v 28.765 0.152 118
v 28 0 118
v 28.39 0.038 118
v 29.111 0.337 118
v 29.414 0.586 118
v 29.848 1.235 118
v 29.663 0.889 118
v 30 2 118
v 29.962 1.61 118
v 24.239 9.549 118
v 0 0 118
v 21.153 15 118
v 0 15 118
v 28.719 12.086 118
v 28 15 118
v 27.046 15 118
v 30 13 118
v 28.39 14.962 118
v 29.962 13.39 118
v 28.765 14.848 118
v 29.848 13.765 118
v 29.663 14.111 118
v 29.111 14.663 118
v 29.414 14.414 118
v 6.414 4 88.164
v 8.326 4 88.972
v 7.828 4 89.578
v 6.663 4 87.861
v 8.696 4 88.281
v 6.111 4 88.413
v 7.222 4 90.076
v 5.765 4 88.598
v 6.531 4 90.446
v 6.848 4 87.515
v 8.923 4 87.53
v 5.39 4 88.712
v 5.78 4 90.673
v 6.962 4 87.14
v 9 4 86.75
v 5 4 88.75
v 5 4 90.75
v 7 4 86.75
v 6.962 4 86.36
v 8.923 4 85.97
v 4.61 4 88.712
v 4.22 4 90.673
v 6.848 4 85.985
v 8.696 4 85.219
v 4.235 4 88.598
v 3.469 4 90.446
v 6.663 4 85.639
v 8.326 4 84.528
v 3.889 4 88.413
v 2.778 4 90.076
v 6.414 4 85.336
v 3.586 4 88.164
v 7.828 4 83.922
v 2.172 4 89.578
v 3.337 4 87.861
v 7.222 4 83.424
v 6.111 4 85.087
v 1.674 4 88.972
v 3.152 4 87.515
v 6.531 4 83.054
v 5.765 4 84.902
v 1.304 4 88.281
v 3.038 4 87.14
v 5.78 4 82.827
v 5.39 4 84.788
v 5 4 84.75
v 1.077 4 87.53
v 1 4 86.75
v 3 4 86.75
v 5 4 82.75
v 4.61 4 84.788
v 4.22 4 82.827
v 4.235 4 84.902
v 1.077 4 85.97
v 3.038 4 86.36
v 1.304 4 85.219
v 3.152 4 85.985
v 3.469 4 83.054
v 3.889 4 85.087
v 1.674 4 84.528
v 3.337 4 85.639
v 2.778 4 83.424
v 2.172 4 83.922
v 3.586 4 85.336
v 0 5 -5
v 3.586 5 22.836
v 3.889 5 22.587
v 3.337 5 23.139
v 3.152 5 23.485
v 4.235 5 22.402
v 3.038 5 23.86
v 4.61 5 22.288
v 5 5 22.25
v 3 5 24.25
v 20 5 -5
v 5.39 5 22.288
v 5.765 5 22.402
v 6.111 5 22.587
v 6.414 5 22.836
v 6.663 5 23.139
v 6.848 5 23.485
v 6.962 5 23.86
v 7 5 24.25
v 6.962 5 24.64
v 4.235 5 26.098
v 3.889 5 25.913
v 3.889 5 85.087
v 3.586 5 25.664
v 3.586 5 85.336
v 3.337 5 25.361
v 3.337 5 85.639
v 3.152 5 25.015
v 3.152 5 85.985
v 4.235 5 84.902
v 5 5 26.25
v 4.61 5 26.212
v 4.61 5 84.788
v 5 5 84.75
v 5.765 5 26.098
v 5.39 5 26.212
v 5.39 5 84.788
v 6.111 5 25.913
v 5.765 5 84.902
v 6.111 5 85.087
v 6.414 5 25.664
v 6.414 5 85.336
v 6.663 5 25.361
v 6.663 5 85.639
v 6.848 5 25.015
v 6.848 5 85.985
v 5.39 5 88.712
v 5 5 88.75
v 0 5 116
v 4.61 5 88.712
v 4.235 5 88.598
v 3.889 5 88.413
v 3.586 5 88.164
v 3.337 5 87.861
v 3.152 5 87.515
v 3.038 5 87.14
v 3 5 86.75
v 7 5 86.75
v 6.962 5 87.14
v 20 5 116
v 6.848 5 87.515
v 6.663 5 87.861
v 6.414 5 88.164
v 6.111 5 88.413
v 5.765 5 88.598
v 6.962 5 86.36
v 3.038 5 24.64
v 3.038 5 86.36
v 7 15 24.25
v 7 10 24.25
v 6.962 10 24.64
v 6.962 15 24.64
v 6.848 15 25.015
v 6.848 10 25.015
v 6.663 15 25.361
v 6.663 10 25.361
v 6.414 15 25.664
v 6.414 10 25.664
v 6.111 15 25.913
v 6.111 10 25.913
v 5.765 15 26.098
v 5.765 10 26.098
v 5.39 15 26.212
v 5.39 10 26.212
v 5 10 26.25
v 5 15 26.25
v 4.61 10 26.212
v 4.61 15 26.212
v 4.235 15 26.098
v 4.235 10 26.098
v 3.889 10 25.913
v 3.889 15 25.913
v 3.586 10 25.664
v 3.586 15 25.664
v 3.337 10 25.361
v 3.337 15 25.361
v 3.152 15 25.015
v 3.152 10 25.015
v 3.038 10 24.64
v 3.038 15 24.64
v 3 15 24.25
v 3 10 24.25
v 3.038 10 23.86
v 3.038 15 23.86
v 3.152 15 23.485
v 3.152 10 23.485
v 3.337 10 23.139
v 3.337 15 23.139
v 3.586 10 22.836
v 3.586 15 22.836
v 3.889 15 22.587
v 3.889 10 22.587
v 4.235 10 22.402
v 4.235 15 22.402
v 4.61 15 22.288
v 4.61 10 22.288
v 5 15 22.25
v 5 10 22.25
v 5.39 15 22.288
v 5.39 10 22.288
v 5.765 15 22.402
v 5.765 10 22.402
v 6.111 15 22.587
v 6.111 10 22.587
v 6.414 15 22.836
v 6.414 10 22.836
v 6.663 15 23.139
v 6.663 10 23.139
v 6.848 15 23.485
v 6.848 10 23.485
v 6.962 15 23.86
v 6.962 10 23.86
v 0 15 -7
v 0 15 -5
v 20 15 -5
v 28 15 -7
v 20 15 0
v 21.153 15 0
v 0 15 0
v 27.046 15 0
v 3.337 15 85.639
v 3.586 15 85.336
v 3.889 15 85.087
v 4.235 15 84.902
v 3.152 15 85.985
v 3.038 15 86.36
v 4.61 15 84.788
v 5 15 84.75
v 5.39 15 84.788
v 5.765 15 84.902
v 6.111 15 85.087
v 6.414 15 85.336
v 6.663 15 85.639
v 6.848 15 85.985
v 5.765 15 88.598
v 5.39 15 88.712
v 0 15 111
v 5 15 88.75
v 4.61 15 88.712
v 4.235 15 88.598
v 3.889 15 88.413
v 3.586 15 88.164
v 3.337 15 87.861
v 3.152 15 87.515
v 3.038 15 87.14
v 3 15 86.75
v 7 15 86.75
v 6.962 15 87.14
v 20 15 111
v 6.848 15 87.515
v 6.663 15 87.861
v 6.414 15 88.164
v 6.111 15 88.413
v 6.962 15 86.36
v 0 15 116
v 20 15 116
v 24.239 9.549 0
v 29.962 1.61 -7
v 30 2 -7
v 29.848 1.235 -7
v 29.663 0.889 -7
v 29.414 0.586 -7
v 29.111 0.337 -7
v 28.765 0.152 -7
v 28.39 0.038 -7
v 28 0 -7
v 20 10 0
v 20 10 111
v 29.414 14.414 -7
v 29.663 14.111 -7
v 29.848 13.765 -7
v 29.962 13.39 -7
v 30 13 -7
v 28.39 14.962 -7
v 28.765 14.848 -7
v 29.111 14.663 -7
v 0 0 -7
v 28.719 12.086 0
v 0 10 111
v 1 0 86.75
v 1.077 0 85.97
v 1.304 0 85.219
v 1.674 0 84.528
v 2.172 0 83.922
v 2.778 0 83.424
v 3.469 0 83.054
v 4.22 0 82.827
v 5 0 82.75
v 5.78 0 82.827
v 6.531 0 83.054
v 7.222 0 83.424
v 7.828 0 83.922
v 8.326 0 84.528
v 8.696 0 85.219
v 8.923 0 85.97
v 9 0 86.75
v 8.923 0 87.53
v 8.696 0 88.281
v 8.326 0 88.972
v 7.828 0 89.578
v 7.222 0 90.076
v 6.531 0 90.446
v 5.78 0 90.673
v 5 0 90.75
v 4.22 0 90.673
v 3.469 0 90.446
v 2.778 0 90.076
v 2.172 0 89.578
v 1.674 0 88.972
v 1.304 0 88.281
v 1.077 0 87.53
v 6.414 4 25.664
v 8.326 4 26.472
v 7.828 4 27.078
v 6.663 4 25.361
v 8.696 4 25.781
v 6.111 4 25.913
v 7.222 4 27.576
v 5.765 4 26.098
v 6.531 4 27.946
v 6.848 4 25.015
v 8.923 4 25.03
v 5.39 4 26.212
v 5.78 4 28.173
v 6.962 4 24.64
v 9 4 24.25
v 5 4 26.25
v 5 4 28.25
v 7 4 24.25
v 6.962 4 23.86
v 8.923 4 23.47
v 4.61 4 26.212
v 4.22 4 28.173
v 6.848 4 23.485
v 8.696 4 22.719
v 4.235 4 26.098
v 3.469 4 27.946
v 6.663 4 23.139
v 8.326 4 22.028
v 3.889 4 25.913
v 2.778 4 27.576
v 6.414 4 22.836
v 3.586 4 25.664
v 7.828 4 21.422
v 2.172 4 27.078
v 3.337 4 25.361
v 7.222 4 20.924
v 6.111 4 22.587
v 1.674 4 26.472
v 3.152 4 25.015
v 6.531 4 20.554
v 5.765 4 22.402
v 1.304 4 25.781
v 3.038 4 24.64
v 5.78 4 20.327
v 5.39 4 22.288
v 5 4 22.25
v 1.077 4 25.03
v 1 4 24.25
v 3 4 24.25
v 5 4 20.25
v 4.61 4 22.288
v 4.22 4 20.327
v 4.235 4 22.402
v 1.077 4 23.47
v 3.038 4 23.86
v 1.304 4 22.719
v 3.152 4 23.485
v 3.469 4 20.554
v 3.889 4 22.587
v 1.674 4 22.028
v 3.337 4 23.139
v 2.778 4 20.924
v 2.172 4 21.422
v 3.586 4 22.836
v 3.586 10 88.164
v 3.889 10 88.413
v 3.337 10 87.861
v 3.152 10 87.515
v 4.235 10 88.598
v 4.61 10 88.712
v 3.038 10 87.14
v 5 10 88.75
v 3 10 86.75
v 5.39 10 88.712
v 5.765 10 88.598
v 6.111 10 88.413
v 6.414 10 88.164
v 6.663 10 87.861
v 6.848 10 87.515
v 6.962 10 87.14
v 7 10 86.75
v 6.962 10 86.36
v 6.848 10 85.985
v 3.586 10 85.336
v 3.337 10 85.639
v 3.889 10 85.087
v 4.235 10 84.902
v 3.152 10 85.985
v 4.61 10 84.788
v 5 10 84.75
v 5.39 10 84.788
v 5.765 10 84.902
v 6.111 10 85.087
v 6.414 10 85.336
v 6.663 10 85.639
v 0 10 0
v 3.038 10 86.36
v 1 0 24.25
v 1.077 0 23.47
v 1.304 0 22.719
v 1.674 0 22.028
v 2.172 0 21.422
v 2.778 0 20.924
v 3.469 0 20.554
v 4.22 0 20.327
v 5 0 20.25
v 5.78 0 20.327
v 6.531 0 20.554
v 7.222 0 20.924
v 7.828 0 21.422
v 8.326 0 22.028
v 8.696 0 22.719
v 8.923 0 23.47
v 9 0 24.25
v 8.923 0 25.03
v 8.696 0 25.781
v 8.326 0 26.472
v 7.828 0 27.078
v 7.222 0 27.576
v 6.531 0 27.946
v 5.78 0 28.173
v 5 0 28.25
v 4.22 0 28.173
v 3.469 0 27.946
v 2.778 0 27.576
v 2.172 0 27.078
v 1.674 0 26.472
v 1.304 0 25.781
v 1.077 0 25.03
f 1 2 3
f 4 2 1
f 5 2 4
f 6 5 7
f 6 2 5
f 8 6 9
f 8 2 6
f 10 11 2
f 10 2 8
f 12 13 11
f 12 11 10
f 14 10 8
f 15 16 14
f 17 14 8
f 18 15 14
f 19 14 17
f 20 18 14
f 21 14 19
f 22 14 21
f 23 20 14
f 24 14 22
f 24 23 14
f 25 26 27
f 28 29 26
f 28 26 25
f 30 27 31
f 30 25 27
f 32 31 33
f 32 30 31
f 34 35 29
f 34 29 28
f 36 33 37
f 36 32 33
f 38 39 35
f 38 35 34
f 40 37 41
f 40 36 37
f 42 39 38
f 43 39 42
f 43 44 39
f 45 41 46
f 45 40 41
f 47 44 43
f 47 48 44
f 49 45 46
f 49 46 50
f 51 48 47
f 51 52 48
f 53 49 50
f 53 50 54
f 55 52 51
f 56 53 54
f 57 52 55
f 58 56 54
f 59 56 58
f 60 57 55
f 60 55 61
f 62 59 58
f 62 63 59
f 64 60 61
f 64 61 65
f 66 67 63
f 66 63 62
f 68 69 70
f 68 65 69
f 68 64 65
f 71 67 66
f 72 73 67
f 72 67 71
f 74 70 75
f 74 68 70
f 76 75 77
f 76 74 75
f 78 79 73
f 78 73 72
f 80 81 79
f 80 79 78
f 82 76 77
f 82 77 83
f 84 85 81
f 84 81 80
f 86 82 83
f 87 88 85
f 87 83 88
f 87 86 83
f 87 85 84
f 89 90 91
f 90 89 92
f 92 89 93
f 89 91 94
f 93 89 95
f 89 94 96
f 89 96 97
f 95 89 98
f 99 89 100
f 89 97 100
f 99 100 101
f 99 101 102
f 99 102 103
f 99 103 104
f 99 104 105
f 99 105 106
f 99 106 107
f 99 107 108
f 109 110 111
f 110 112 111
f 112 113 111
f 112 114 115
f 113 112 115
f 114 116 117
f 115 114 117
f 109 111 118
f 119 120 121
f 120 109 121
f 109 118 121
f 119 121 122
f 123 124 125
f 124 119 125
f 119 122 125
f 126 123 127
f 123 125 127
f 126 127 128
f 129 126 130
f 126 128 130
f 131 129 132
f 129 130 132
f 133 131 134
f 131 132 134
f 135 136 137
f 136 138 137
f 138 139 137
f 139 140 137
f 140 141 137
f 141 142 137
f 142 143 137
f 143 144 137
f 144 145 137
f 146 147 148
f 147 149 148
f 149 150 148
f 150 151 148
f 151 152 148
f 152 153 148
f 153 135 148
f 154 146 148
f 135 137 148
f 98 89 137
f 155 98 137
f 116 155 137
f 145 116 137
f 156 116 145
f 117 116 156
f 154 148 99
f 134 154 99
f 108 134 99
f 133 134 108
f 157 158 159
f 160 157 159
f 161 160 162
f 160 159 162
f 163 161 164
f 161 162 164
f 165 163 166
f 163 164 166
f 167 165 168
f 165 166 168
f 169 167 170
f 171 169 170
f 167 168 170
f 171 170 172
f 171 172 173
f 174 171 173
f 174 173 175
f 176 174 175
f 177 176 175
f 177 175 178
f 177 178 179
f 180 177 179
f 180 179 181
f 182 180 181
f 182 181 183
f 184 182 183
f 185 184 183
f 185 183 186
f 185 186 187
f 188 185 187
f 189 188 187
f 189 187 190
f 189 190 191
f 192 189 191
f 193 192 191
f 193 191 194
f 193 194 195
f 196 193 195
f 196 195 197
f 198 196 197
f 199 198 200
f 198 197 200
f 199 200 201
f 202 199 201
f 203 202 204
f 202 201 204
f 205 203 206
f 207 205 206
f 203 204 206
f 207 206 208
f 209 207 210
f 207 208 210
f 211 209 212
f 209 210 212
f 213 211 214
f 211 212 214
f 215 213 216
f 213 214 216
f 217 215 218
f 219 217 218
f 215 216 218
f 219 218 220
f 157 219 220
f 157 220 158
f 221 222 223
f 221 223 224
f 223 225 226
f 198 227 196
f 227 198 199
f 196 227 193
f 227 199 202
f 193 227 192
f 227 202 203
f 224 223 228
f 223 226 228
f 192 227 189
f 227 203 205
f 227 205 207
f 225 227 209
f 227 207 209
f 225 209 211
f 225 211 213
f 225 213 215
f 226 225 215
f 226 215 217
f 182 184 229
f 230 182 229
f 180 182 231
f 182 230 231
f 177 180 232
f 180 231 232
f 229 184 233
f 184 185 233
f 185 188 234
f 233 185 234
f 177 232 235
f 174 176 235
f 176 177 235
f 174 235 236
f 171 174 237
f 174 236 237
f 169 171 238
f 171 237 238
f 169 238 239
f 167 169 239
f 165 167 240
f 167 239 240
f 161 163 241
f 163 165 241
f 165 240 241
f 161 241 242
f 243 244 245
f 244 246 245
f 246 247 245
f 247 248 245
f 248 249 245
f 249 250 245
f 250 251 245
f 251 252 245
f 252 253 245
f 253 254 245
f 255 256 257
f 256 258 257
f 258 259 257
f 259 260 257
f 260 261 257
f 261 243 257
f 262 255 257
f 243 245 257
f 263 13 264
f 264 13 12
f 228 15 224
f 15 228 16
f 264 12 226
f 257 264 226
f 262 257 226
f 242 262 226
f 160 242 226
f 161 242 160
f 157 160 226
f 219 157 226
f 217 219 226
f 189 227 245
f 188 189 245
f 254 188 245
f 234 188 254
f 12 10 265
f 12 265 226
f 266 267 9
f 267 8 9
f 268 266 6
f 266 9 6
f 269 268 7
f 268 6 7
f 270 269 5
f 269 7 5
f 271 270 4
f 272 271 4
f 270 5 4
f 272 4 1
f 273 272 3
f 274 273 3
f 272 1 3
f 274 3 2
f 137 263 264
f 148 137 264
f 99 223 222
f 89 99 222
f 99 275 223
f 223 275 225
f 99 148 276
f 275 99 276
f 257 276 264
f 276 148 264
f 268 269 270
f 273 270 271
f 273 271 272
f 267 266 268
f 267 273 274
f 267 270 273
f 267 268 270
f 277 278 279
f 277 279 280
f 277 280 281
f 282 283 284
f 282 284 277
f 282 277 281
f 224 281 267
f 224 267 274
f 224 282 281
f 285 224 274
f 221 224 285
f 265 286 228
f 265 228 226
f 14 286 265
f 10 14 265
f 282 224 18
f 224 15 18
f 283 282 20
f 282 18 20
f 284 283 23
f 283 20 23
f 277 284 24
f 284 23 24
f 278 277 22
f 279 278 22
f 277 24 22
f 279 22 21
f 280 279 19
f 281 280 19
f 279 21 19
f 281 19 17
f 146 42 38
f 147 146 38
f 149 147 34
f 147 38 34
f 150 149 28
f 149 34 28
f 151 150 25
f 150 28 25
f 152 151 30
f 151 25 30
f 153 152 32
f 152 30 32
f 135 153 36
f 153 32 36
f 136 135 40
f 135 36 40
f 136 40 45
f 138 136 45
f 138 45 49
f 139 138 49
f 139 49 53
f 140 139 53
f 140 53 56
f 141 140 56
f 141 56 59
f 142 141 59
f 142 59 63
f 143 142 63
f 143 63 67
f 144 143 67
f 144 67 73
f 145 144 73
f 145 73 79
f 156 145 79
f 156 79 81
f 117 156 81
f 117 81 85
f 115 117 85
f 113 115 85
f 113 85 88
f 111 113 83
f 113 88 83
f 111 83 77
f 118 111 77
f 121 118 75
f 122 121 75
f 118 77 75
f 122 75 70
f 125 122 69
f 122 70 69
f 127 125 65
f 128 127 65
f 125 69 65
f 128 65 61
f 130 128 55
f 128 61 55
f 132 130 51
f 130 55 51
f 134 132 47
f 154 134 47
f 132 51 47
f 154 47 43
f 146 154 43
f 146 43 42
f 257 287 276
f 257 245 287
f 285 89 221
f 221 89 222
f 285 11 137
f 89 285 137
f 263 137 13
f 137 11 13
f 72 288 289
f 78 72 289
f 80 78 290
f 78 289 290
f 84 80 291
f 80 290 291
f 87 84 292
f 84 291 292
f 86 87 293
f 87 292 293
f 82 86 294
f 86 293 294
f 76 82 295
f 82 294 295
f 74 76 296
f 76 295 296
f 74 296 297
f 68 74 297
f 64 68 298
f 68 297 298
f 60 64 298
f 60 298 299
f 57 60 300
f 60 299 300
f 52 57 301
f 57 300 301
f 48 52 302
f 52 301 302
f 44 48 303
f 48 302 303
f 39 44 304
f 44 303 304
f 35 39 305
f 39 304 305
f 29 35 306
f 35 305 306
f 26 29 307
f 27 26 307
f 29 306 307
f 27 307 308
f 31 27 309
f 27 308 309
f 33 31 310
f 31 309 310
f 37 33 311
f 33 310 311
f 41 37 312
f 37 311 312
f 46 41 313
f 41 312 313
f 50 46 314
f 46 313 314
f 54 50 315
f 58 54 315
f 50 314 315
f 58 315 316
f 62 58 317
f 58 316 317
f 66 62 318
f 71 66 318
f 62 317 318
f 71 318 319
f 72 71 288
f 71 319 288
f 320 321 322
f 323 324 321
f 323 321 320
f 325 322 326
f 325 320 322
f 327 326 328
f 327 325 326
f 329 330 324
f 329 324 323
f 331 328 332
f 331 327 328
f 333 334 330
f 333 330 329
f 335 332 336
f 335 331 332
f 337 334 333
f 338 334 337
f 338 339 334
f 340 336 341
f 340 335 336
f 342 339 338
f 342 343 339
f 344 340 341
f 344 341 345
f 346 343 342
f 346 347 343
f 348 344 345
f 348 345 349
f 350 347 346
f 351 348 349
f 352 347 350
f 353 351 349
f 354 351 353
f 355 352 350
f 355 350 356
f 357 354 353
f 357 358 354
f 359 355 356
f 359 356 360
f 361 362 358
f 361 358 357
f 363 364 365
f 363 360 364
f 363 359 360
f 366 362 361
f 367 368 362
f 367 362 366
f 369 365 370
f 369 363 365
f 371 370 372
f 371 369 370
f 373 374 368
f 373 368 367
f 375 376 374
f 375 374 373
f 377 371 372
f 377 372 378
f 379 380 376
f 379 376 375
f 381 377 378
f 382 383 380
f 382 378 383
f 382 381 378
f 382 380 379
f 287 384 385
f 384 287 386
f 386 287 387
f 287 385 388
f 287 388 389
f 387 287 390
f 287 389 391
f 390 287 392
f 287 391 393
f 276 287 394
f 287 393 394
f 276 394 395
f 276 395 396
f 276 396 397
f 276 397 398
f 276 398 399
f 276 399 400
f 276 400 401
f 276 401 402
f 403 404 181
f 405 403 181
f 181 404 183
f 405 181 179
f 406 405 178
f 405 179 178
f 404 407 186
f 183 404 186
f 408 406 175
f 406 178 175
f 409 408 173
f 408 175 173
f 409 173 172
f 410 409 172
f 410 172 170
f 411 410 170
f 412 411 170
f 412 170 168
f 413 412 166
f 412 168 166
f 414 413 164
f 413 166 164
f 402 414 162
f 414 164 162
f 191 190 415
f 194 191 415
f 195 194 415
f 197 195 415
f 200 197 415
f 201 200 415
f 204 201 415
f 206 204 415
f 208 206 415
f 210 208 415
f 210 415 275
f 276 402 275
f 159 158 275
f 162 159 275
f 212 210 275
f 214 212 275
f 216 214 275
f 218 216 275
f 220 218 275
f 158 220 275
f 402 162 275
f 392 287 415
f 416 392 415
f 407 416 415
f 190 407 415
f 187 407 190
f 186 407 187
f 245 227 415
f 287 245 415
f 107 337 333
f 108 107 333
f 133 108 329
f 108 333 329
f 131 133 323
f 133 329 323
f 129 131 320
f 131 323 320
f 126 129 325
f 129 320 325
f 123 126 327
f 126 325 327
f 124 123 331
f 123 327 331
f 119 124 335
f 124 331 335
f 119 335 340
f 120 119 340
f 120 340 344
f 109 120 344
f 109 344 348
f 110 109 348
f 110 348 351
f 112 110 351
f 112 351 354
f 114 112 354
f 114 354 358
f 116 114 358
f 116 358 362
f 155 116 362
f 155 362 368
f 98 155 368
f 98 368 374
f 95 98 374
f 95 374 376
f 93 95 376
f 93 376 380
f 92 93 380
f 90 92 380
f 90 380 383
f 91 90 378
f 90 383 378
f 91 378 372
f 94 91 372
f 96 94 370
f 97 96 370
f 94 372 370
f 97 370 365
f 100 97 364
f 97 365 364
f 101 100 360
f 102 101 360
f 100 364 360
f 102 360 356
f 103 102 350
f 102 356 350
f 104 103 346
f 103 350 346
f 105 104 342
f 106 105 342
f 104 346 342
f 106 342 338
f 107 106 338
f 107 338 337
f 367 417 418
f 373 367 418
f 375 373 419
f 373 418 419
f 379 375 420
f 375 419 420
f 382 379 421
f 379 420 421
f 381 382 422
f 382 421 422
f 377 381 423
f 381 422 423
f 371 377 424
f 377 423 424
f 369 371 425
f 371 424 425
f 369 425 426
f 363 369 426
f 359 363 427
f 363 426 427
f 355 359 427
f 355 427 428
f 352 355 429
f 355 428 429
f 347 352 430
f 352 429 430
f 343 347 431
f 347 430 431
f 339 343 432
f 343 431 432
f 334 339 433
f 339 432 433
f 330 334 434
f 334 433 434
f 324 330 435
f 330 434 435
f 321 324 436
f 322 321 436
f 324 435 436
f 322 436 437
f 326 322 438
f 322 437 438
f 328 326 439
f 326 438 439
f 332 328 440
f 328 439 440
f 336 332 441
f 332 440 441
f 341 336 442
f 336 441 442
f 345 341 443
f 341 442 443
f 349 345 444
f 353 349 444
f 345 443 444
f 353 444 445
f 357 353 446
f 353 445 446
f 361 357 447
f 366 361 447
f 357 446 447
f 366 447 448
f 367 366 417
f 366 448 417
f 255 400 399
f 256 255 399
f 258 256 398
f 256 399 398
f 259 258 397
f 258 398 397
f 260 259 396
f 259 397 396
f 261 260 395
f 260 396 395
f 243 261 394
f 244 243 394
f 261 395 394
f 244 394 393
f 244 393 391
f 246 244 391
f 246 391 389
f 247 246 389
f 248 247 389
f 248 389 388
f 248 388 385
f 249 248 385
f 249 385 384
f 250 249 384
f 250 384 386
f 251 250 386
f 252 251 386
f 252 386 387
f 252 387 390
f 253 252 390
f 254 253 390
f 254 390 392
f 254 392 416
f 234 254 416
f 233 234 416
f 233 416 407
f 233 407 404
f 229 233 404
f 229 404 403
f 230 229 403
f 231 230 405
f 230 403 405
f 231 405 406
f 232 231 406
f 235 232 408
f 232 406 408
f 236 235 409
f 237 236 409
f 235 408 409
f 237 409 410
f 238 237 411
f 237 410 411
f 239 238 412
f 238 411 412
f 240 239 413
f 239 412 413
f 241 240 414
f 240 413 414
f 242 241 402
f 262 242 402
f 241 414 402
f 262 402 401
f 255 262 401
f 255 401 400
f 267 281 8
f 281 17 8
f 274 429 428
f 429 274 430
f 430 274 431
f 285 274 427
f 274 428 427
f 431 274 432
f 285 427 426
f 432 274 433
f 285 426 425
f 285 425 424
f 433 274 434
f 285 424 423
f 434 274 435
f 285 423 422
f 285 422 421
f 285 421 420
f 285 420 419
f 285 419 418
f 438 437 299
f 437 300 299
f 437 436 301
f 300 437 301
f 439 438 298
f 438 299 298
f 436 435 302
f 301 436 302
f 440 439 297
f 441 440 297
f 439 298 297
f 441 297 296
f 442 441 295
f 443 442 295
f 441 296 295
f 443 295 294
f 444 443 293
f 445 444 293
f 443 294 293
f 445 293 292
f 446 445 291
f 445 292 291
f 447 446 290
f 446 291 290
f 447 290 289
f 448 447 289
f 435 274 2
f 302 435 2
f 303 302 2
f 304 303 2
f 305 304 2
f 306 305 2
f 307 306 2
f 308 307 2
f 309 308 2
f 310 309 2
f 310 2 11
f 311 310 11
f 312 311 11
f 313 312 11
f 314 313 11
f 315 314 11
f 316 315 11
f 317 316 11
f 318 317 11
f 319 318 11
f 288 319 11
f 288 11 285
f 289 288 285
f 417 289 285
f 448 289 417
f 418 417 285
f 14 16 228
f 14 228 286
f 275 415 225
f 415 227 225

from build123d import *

# Parameters (mm, degrees)
SALIENTE_EXTRUIR1_DEPTH = 111
SALIENTE_EXTRUIR2_DEPTH = 5
CROQUIS3_W              = 20
CROQUIS3_H              = 5
SALIENTE_EXTRUIR3_DEPTH = 2
SALIENTE_EXTRUIR4_DEPTH = 5
SALIENTE_EXTRUIR5_DEPTH = 2
CROQUIS6_R              = 2
CORTAR_EXTRUIR1_DEPTH   = 41
CROQUIS7_R              = 4
CORTAR_EXTRUIR2_DEPTH   = 4
CORTAR_EXTRUIR4_DEPTH   = 118


with BuildPart() as part:
    # Croquis1 → Saliente-Extruir1 (new body)
    with BuildSketch(Plane.XY):
        with BuildLine():
            Line((0, 5), (0, 0))
            Line((0, 0), (28, 0))
            ThreePointArc((28, 0), (29.414213562, 0.585786438), (30, 2))
            Line((30, 2), (30, 13))
            ThreePointArc((30, 13), (29.414213562, 14.414213562), (28, 15))
            Line((28, 15), (0, 15))
            Line((0, 15), (0, 10))
            Line((0, 10), (20, 10))
            Line((20, 10), (20, 5))
            Line((20, 5), (0, 5))
        make_face()
    extrude(amount=SALIENTE_EXTRUIR1_DEPTH)

    # Croquis2 → Saliente-Extruir2 (add)
    with BuildSketch(Plane.XY.offset(111)):
        with BuildLine():
            Line((20, 15), (20, 10))
            Line((20, 10), (20, 5))
            Line((20, 5), (0, 5))
            Line((0, 5), (0, 0))
            Line((0, 0), (28, 0))
            ThreePointArc((28, 0), (29.414213562, 0.585786438), (30, 2))
            Line((30, 2), (30, 13))
            ThreePointArc((30, 13), (29.414213562, 14.414213562), (28, 15))
            Line((28, 15), (20, 15))
        make_face()
    extrude(amount=SALIENTE_EXTRUIR2_DEPTH)

    # Croquis3 → Saliente-Extruir3 (add)
    with BuildSketch(Plane.XY.offset(116)):
        Polygon((20, 10), (20, 15), (11, 15), (0, 15), (0, 10), align=None)
        with BuildLine():
            Line((28, 15), (20, 15))
            Line((20, 15), (20, 10))
            Line((20, 10), (20, 5))
            Line((20, 5), (0, 5))
            Line((0, 5), (0, 0))
            Line((0, 0), (28, 0))
            ThreePointArc((28, 0), (29.414213562, 0.585786438), (30, 2))
            Line((30, 2), (30, 13))
            ThreePointArc((30, 13), (29.414213562, 14.414213562), (28, 15))
        make_face()
        with Locations((10, 7.5)):
            Rectangle(CROQUIS3_W, CROQUIS3_H)
    extrude(amount=SALIENTE_EXTRUIR3_DEPTH)

    # Croquis4 → Saliente-Extruir4 (add)
    with BuildSketch(Plane(origin=(0, 0, 0), x_dir=(-1, 0, 0), z_dir=(0, 0, -1))):
        with BuildLine():
            Line((-20, 5), (-20, 10))
            Line((-20, 10), (-20, 15))
            Line((-20, 15), (-28, 15))
            ThreePointArc((-28, 15), (-29.414213562, 14.414213562), (-30, 13))
            Line((-30, 13), (-30, 2))
            ThreePointArc((-30, 2), (-29.414213562, 0.585786438), (-28, 0))
            Line((-28, 0), (0, 0))
            Line((0, 0), (0, 5))
            Line((0, 5), (-20, 5))
        make_face()
    extrude(amount=SALIENTE_EXTRUIR4_DEPTH)

    # Croquis5 → Saliente-Extruir5 (add)
    with BuildSketch(Plane(origin=(0, 0, -5), x_dir=(-1, 0, 0), z_dir=(0, 0, -1))):
        with BuildLine():
            Line((0, 15), (-28, 15))
            ThreePointArc((-28, 15), (-29.414213562, 14.414213562), (-30, 13))
            Line((-30, 13), (-30, 2))
            ThreePointArc((-30, 2), (-29.414213562, 0.585786438), (-28, 0))
            Line((-28, 0), (0, 0))
            Line((0, 0), (0, 15))
        make_face()
    extrude(amount=SALIENTE_EXTRUIR5_DEPTH)

    # Croquis6 → Cortar-Extruir1 (cut)
    with BuildSketch(Plane.XZ):
        with Locations((5, 24.25)):
            Circle(CROQUIS6_R)
        with Locations((5, 86.75)):
            Circle(CROQUIS6_R)
    extrude(amount=-CORTAR_EXTRUIR1_DEPTH, mode=Mode.SUBTRACT)

    # Croquis7 → Cortar-Extruir2 (cut)
    with BuildSketch(Plane(origin=(0, 0, 0), x_dir=(-1, 0, 0), z_dir=(0, -1, 0))):
        with Locations((-5, -24.25)):
            Circle(CROQUIS7_R)
        with Locations((-5, -86.75)):
            Circle(CROQUIS7_R)
    extrude(amount=-CORTAR_EXTRUIR2_DEPTH, mode=Mode.SUBTRACT)

    # Croquis9 → Cortar-Extruir4 (cut)
    with BuildSketch(Plane.XY.offset(118)):
        Polygon((27.046454018, 15), (28.719274454, 12.085683765), (24.239354869, 9.549004814), (21.152820727, 15), align=None)
    extrude(amount=-CORTAR_EXTRUIR4_DEPTH, mode=Mode.SUBTRACT)


solid = part.part
